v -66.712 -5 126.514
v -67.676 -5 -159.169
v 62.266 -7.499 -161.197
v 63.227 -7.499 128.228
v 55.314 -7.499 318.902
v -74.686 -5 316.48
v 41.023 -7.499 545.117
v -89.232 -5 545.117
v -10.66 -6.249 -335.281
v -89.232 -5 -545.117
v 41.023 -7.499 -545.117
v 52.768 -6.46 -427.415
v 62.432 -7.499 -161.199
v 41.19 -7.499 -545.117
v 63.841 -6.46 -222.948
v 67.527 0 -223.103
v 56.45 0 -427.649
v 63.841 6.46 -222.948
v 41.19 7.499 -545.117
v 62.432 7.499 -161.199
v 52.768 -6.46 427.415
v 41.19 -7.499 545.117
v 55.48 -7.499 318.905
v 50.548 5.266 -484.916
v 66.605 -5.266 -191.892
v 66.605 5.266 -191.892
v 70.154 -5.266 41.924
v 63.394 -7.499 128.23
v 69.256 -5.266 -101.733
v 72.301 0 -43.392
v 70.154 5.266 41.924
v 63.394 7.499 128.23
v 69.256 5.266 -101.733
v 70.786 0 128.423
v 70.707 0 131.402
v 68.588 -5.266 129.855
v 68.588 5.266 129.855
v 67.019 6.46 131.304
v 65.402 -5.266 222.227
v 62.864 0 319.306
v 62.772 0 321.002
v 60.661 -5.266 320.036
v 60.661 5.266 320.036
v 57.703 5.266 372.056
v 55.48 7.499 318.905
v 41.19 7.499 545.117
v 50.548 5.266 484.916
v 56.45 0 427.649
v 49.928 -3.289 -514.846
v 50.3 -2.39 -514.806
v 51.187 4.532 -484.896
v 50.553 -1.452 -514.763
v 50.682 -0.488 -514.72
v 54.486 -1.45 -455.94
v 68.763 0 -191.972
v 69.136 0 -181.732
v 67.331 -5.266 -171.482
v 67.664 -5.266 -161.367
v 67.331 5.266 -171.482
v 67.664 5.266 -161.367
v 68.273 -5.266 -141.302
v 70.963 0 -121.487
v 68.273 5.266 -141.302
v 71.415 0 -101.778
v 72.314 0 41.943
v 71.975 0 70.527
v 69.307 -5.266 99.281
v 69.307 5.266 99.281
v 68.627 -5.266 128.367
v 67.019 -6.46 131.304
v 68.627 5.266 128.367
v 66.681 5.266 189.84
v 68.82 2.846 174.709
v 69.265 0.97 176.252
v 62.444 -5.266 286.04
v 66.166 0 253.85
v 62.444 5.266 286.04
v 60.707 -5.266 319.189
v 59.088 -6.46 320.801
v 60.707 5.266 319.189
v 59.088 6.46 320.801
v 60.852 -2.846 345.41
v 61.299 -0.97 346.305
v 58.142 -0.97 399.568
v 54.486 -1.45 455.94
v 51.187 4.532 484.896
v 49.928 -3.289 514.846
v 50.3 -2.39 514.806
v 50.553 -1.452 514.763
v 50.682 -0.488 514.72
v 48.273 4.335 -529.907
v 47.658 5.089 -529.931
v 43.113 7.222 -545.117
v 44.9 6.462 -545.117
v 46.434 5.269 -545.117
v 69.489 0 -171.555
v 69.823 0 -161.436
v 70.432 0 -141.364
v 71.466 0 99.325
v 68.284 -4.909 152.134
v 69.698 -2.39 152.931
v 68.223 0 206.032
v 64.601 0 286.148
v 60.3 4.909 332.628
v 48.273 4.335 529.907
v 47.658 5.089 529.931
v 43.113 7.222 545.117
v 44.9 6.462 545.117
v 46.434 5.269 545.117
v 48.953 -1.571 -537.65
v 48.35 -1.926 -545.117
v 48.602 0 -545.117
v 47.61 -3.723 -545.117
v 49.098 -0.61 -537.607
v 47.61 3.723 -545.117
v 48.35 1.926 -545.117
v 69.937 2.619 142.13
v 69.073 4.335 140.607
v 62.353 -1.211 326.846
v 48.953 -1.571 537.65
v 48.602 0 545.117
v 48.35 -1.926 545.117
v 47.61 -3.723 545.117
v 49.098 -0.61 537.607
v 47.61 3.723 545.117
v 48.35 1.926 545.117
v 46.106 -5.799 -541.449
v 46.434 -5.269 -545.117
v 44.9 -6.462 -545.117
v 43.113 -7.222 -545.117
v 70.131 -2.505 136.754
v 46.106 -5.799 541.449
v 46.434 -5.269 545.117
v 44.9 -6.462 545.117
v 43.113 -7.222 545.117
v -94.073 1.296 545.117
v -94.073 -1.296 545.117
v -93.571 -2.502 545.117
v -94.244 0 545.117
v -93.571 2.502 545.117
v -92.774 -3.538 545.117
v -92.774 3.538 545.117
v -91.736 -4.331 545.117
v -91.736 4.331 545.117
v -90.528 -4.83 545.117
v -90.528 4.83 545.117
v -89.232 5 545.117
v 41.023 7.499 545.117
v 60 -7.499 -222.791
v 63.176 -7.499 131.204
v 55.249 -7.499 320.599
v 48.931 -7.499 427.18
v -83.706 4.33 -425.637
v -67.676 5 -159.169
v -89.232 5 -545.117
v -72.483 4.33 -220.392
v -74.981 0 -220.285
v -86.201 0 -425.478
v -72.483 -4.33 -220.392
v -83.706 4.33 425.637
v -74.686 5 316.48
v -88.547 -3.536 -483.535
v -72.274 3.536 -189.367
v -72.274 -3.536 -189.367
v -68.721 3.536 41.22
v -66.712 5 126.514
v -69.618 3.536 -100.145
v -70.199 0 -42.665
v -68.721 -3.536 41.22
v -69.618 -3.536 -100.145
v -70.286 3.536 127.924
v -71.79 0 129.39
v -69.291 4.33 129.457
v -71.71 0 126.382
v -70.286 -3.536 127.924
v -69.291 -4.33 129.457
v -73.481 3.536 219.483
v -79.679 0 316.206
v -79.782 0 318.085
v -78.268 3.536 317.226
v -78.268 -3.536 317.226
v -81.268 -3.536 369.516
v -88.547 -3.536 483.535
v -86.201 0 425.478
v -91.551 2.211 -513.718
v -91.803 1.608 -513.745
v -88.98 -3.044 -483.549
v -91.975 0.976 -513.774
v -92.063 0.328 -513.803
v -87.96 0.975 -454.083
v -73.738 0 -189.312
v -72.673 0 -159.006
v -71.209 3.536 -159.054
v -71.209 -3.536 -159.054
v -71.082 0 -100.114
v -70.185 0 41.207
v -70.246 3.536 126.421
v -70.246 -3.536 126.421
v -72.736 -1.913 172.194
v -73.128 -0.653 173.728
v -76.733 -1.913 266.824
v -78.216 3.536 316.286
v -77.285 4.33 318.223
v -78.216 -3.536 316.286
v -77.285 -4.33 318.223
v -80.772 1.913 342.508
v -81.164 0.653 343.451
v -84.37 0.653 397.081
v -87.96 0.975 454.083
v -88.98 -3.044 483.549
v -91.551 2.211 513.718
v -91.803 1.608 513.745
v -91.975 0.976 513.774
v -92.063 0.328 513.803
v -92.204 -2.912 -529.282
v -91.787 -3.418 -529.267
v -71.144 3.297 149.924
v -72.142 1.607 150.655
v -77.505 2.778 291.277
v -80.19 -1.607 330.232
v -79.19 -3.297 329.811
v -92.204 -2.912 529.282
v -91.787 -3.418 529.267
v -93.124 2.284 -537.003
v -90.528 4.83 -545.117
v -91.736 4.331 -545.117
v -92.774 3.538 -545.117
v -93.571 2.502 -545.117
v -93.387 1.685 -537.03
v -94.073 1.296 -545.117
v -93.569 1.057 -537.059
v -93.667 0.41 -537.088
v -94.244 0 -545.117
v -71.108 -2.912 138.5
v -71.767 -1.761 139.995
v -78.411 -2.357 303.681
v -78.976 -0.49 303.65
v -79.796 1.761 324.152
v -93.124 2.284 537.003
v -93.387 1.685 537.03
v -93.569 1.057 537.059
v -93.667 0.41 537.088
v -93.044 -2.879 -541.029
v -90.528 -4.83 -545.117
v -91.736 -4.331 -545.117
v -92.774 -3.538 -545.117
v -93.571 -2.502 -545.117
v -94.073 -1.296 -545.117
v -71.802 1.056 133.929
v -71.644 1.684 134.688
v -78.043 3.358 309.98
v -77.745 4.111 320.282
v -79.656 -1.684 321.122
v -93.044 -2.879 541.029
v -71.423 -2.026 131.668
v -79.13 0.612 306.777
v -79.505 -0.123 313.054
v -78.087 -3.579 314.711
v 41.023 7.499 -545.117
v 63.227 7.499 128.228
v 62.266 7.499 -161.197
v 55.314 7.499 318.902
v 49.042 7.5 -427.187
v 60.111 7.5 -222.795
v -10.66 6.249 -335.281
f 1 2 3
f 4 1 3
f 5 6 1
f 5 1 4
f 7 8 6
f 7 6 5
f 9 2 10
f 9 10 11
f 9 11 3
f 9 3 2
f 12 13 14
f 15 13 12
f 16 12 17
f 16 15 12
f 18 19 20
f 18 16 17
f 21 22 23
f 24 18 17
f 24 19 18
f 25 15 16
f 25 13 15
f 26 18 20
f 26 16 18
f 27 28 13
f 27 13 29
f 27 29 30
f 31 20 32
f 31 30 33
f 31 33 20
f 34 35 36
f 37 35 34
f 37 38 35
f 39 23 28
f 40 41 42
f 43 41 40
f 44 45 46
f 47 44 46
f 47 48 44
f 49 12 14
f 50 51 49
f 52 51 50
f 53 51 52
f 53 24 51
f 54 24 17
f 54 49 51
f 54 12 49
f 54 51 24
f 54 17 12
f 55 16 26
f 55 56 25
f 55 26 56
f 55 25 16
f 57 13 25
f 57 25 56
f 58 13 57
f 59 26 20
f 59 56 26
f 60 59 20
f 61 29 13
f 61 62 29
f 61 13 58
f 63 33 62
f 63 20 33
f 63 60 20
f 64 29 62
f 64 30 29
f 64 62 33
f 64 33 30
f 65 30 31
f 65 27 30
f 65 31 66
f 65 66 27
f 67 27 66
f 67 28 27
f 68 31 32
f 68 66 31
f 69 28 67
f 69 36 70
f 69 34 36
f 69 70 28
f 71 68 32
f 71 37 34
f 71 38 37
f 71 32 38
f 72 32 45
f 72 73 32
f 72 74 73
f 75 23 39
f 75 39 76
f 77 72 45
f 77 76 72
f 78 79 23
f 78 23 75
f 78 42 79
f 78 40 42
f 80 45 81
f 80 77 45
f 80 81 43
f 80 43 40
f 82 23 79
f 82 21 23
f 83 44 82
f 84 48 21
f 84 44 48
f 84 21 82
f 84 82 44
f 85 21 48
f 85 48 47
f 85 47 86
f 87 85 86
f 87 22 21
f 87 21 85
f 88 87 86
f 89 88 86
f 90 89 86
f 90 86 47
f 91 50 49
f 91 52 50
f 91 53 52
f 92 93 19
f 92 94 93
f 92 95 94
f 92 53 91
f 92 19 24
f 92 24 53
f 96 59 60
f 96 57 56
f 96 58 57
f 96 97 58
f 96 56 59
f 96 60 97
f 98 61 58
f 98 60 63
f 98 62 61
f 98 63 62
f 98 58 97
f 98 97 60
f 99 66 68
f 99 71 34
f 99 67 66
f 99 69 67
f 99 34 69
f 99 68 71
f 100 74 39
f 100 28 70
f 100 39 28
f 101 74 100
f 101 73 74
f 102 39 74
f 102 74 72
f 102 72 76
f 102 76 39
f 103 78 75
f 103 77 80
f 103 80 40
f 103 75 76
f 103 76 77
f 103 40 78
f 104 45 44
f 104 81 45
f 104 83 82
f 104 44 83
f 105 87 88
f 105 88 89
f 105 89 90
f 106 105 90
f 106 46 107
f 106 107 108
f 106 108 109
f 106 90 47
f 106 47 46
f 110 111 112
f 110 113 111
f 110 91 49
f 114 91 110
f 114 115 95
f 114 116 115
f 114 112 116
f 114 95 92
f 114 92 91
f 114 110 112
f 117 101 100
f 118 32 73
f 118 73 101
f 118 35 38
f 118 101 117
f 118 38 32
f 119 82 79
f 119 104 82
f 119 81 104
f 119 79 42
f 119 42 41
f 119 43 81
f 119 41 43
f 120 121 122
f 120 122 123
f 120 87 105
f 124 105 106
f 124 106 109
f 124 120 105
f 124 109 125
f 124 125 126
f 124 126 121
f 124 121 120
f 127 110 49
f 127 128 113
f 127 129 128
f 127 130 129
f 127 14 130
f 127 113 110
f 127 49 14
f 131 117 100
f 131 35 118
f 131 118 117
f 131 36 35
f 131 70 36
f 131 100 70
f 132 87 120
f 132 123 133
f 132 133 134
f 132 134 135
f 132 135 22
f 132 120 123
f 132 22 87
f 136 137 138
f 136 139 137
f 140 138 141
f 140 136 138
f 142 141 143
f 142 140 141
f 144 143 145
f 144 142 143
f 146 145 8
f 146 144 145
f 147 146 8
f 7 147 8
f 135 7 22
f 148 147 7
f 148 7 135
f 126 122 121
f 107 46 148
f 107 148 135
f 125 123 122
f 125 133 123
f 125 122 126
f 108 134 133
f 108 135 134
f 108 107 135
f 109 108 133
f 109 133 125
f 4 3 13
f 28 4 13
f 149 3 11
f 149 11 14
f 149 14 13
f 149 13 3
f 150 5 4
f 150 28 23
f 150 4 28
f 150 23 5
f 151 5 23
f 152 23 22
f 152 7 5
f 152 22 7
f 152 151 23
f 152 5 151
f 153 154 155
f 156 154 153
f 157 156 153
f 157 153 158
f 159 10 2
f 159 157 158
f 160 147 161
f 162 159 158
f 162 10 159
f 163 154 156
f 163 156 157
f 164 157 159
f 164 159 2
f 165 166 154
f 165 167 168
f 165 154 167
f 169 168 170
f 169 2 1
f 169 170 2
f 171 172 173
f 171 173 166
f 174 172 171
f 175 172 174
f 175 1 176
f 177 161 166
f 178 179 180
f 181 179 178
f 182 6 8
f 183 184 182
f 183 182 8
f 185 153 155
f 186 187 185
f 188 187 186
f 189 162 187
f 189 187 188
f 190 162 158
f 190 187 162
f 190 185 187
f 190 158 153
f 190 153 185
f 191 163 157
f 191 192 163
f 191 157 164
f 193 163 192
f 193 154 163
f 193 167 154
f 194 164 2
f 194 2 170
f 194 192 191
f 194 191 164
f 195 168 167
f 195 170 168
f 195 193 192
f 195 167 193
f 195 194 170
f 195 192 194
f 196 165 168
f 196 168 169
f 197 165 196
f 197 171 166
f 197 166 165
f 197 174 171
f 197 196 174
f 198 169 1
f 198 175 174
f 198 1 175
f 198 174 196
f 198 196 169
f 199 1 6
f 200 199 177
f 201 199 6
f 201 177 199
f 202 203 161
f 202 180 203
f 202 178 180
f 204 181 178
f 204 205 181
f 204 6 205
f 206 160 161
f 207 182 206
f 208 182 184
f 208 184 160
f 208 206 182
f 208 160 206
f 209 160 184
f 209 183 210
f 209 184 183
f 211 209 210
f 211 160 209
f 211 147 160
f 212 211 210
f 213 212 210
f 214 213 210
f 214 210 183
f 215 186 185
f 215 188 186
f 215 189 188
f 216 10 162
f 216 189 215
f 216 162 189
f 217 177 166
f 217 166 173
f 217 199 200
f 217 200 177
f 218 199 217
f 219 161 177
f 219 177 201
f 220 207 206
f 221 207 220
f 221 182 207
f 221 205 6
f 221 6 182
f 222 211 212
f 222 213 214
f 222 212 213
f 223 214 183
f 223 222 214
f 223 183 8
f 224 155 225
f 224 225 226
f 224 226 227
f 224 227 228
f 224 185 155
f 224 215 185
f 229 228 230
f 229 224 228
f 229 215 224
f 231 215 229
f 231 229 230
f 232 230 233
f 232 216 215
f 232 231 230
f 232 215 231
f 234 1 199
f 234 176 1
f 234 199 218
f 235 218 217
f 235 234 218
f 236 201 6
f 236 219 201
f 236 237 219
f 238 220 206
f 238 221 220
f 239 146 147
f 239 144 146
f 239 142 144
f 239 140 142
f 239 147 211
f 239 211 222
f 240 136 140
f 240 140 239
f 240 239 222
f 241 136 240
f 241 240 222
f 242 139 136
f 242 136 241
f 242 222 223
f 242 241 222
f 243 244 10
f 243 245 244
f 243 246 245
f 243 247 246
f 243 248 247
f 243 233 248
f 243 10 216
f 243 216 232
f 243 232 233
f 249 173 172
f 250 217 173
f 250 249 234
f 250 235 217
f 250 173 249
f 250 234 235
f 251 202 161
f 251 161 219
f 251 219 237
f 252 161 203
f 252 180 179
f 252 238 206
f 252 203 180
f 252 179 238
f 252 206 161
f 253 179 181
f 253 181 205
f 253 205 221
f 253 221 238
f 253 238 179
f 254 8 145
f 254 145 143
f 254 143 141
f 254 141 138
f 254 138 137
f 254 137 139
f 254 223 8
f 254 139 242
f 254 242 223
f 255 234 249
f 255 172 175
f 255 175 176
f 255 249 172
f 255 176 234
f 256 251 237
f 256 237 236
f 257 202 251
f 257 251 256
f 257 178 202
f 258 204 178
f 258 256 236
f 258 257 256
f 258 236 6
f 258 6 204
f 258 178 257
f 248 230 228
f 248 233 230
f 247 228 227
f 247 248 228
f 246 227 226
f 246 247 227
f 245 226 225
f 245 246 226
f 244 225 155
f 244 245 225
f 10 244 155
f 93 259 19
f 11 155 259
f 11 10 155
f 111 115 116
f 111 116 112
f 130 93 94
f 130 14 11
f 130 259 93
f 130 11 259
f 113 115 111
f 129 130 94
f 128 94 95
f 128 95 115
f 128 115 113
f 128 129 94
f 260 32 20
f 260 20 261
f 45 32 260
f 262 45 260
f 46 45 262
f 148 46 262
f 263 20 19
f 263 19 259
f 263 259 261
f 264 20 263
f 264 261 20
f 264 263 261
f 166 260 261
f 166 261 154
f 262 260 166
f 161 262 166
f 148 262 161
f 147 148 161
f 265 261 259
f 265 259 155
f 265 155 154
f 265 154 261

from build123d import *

# Parameters (mm, degrees)
SKETCH3_W          = 147.197168892
SKETCH3_H          = 17.539277342
SKETCH3_W_2        = 144.574061536
SKETCH3_H_2        = 20.253471686
CUT_EXTRUDE1_DEPTH = 35


with BuildPart() as part:
    # Sweep2: sweep along a path in Sketch2
    with BuildLine() as sweep2_path:  # in the path sketch's own coordinates; laid on its plane below (add() does not lay a ready-made edge on the line's plane)
        add(Edge.make_bspline(
            [(-24.41476581, 550), (8.13825527, 84.470109879), (8.13825527, -84.470109879), (-24.41476581, -550)],
            knots=[0, 0, 0, 0, 1, 1, 1, 1], degree=3))
    # Sketch1 → Sweep2 (sweep)
    with BuildSketch(Plane.XY):
        with BuildLine():
            Line((-65, 5), (64.939055745, 7.498827995))
            ThreePointArc((64.939055745, 7.498827995), (65.022313811, 7.499735711), (65.105575448, 7.499256885))
            ThreePointArc((65.105575448, 7.499256885), (72.5, 0), (65.105575448, -7.499256885))
            ThreePointArc((65.105575448, -7.499256885), (65.022313811, -7.499735711), (64.939055745, -7.498827995))
            Line((64.939055745, -7.498827995), (-65, -5))
            ThreePointArc((-65, -5), (-70, 0), (-65, 5))
        make_face()
    sweep(path=Plane(origin=(0, 0, 0), x_dir=(1, 0, 0), z_dir=(0, 1, 0)) * sweep2_path.line)

    # Sketch3 → Cut-Extrude1 (cut, symmetric)
    with BuildSketch(Plane(origin=(0, 0, 0), x_dir=(1, 0, 0), z_dir=(0, 1, 0))):
        with Locations((-20.645664883, 553.886685509)):
            Rectangle(SKETCH3_W, SKETCH3_H)
        with Locations((-21.957218561, -555.243782681)):
            Rectangle(SKETCH3_W_2, SKETCH3_H_2)
    extrude(amount=CUT_EXTRUDE1_DEPTH, both=True, mode=Mode.SUBTRACT)


solid = part.part
